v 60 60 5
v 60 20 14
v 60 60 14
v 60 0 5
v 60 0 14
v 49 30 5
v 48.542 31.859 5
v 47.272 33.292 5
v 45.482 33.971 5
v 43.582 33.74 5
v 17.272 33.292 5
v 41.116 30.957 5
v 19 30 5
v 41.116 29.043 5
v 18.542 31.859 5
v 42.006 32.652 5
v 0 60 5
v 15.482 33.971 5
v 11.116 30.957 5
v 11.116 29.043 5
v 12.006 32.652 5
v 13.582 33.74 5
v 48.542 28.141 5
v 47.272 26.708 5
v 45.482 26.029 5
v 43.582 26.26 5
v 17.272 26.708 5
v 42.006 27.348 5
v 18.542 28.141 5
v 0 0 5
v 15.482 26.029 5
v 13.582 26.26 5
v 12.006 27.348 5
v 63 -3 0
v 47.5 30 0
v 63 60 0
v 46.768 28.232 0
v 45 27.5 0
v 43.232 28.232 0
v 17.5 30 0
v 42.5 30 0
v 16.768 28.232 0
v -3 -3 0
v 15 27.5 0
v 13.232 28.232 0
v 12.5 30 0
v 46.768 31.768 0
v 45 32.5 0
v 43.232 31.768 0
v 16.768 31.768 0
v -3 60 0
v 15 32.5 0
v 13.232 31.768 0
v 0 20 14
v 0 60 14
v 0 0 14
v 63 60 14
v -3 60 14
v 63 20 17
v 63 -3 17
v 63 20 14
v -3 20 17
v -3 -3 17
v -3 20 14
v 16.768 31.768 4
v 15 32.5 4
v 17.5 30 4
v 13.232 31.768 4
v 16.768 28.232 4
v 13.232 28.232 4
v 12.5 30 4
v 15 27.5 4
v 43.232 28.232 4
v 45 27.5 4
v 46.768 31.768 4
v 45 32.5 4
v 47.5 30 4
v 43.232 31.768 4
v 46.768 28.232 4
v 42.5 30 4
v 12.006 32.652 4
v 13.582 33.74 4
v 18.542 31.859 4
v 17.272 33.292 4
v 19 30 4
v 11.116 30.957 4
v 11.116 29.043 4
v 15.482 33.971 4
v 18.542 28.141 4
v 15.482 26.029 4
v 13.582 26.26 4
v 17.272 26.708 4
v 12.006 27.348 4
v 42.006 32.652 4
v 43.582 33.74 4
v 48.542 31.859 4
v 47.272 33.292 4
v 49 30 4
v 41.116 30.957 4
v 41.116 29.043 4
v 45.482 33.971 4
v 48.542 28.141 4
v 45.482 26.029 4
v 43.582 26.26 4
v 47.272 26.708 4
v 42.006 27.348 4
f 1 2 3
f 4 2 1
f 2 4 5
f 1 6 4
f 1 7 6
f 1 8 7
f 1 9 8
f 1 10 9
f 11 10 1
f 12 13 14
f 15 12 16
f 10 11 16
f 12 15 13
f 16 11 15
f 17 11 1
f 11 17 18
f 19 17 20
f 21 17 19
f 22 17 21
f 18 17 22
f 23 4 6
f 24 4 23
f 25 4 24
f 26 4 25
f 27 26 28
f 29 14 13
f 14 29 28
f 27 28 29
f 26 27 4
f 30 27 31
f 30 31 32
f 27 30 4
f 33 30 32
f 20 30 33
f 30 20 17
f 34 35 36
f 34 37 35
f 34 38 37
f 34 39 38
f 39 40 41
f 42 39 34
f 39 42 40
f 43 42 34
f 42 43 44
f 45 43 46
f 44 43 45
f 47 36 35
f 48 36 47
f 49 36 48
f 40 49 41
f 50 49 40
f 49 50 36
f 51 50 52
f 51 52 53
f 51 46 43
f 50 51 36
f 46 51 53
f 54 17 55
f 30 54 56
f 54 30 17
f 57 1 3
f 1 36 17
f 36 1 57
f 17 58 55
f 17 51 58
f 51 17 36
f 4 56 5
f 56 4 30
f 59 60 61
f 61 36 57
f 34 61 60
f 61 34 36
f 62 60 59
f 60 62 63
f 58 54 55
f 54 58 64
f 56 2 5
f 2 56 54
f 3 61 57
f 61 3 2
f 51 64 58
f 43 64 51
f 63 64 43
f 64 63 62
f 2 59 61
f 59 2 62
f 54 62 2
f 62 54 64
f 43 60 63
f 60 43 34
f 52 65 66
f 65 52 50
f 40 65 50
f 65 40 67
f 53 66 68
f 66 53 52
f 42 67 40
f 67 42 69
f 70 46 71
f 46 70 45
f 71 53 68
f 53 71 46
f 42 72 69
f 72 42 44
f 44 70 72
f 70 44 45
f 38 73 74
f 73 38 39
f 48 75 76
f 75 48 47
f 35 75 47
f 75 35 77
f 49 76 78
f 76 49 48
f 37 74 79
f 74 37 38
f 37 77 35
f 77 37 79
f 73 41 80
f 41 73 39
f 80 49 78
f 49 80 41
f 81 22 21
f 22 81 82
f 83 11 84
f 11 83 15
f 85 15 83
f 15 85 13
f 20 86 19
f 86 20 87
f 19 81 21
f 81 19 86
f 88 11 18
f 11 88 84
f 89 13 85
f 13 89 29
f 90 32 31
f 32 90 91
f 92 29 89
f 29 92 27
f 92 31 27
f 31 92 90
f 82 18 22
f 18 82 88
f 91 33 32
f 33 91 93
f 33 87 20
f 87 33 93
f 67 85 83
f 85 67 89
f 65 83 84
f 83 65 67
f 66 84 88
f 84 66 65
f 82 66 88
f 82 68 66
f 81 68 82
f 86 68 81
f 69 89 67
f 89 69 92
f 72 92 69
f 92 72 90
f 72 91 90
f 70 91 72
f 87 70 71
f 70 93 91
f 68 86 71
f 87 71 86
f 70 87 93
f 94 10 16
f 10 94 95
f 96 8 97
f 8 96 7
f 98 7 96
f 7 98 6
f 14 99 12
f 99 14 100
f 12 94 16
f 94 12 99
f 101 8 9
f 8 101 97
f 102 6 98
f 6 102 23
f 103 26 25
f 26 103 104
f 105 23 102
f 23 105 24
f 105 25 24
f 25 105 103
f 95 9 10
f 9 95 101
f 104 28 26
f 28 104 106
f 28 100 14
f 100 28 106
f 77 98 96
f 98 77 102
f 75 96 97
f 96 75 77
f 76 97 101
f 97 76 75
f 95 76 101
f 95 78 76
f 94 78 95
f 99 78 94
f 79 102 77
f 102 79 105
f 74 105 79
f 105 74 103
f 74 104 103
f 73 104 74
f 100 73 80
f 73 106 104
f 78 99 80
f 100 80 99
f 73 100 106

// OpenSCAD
// [FL_INDEX: keywords="openscad, 3d_parametric, Customizable_Phone_Wall_Mount, csg_solid" | COT="Parametric OpenSCAD design from 3DCodeverse"]
// Title: Customizable Phone Wall Mount

// The length of the backplate of the mount
backplateHeight = 60;

// The width of the backplate of the mount, exluding the sides
backplateWidth = 60;

// The height of the front plate
frontPlateHeight = 20;

// The thickness of the phone
phoneThickness = 9;

module plate(){
	cube([backplateWidth, backplateHeight, 5]);
	translate([-3, -3, 5 + phoneThickness]) cube([backplateWidth + 6, frontPlateHeight + 3, 3]);
	translate([-3, -3, 0]) cube([backplateWidth + 6, 3, phoneThickness + 5]);
	translate([backplateWidth, 0, 0]) cube([3, backplateHeight, 14]);
	translate([-3, 0, 0]) cube([3, backplateHeight, 14]);
}

difference() {
	plate();
	translate([(backplateWidth/4), 30, -2]) cylinder(r = 2.5, h = 12);
	translate([3*(backplateWidth/4), 30, -2]) cylinder(r = 2.5, h = 12);
	translate([(backplateWidth/4), 30, 4]) cylinder(r = 4, h = 2);
	translate([3*(backplateWidth/4), 30, 4]) cylinder(r = 4, h = 2);
}
